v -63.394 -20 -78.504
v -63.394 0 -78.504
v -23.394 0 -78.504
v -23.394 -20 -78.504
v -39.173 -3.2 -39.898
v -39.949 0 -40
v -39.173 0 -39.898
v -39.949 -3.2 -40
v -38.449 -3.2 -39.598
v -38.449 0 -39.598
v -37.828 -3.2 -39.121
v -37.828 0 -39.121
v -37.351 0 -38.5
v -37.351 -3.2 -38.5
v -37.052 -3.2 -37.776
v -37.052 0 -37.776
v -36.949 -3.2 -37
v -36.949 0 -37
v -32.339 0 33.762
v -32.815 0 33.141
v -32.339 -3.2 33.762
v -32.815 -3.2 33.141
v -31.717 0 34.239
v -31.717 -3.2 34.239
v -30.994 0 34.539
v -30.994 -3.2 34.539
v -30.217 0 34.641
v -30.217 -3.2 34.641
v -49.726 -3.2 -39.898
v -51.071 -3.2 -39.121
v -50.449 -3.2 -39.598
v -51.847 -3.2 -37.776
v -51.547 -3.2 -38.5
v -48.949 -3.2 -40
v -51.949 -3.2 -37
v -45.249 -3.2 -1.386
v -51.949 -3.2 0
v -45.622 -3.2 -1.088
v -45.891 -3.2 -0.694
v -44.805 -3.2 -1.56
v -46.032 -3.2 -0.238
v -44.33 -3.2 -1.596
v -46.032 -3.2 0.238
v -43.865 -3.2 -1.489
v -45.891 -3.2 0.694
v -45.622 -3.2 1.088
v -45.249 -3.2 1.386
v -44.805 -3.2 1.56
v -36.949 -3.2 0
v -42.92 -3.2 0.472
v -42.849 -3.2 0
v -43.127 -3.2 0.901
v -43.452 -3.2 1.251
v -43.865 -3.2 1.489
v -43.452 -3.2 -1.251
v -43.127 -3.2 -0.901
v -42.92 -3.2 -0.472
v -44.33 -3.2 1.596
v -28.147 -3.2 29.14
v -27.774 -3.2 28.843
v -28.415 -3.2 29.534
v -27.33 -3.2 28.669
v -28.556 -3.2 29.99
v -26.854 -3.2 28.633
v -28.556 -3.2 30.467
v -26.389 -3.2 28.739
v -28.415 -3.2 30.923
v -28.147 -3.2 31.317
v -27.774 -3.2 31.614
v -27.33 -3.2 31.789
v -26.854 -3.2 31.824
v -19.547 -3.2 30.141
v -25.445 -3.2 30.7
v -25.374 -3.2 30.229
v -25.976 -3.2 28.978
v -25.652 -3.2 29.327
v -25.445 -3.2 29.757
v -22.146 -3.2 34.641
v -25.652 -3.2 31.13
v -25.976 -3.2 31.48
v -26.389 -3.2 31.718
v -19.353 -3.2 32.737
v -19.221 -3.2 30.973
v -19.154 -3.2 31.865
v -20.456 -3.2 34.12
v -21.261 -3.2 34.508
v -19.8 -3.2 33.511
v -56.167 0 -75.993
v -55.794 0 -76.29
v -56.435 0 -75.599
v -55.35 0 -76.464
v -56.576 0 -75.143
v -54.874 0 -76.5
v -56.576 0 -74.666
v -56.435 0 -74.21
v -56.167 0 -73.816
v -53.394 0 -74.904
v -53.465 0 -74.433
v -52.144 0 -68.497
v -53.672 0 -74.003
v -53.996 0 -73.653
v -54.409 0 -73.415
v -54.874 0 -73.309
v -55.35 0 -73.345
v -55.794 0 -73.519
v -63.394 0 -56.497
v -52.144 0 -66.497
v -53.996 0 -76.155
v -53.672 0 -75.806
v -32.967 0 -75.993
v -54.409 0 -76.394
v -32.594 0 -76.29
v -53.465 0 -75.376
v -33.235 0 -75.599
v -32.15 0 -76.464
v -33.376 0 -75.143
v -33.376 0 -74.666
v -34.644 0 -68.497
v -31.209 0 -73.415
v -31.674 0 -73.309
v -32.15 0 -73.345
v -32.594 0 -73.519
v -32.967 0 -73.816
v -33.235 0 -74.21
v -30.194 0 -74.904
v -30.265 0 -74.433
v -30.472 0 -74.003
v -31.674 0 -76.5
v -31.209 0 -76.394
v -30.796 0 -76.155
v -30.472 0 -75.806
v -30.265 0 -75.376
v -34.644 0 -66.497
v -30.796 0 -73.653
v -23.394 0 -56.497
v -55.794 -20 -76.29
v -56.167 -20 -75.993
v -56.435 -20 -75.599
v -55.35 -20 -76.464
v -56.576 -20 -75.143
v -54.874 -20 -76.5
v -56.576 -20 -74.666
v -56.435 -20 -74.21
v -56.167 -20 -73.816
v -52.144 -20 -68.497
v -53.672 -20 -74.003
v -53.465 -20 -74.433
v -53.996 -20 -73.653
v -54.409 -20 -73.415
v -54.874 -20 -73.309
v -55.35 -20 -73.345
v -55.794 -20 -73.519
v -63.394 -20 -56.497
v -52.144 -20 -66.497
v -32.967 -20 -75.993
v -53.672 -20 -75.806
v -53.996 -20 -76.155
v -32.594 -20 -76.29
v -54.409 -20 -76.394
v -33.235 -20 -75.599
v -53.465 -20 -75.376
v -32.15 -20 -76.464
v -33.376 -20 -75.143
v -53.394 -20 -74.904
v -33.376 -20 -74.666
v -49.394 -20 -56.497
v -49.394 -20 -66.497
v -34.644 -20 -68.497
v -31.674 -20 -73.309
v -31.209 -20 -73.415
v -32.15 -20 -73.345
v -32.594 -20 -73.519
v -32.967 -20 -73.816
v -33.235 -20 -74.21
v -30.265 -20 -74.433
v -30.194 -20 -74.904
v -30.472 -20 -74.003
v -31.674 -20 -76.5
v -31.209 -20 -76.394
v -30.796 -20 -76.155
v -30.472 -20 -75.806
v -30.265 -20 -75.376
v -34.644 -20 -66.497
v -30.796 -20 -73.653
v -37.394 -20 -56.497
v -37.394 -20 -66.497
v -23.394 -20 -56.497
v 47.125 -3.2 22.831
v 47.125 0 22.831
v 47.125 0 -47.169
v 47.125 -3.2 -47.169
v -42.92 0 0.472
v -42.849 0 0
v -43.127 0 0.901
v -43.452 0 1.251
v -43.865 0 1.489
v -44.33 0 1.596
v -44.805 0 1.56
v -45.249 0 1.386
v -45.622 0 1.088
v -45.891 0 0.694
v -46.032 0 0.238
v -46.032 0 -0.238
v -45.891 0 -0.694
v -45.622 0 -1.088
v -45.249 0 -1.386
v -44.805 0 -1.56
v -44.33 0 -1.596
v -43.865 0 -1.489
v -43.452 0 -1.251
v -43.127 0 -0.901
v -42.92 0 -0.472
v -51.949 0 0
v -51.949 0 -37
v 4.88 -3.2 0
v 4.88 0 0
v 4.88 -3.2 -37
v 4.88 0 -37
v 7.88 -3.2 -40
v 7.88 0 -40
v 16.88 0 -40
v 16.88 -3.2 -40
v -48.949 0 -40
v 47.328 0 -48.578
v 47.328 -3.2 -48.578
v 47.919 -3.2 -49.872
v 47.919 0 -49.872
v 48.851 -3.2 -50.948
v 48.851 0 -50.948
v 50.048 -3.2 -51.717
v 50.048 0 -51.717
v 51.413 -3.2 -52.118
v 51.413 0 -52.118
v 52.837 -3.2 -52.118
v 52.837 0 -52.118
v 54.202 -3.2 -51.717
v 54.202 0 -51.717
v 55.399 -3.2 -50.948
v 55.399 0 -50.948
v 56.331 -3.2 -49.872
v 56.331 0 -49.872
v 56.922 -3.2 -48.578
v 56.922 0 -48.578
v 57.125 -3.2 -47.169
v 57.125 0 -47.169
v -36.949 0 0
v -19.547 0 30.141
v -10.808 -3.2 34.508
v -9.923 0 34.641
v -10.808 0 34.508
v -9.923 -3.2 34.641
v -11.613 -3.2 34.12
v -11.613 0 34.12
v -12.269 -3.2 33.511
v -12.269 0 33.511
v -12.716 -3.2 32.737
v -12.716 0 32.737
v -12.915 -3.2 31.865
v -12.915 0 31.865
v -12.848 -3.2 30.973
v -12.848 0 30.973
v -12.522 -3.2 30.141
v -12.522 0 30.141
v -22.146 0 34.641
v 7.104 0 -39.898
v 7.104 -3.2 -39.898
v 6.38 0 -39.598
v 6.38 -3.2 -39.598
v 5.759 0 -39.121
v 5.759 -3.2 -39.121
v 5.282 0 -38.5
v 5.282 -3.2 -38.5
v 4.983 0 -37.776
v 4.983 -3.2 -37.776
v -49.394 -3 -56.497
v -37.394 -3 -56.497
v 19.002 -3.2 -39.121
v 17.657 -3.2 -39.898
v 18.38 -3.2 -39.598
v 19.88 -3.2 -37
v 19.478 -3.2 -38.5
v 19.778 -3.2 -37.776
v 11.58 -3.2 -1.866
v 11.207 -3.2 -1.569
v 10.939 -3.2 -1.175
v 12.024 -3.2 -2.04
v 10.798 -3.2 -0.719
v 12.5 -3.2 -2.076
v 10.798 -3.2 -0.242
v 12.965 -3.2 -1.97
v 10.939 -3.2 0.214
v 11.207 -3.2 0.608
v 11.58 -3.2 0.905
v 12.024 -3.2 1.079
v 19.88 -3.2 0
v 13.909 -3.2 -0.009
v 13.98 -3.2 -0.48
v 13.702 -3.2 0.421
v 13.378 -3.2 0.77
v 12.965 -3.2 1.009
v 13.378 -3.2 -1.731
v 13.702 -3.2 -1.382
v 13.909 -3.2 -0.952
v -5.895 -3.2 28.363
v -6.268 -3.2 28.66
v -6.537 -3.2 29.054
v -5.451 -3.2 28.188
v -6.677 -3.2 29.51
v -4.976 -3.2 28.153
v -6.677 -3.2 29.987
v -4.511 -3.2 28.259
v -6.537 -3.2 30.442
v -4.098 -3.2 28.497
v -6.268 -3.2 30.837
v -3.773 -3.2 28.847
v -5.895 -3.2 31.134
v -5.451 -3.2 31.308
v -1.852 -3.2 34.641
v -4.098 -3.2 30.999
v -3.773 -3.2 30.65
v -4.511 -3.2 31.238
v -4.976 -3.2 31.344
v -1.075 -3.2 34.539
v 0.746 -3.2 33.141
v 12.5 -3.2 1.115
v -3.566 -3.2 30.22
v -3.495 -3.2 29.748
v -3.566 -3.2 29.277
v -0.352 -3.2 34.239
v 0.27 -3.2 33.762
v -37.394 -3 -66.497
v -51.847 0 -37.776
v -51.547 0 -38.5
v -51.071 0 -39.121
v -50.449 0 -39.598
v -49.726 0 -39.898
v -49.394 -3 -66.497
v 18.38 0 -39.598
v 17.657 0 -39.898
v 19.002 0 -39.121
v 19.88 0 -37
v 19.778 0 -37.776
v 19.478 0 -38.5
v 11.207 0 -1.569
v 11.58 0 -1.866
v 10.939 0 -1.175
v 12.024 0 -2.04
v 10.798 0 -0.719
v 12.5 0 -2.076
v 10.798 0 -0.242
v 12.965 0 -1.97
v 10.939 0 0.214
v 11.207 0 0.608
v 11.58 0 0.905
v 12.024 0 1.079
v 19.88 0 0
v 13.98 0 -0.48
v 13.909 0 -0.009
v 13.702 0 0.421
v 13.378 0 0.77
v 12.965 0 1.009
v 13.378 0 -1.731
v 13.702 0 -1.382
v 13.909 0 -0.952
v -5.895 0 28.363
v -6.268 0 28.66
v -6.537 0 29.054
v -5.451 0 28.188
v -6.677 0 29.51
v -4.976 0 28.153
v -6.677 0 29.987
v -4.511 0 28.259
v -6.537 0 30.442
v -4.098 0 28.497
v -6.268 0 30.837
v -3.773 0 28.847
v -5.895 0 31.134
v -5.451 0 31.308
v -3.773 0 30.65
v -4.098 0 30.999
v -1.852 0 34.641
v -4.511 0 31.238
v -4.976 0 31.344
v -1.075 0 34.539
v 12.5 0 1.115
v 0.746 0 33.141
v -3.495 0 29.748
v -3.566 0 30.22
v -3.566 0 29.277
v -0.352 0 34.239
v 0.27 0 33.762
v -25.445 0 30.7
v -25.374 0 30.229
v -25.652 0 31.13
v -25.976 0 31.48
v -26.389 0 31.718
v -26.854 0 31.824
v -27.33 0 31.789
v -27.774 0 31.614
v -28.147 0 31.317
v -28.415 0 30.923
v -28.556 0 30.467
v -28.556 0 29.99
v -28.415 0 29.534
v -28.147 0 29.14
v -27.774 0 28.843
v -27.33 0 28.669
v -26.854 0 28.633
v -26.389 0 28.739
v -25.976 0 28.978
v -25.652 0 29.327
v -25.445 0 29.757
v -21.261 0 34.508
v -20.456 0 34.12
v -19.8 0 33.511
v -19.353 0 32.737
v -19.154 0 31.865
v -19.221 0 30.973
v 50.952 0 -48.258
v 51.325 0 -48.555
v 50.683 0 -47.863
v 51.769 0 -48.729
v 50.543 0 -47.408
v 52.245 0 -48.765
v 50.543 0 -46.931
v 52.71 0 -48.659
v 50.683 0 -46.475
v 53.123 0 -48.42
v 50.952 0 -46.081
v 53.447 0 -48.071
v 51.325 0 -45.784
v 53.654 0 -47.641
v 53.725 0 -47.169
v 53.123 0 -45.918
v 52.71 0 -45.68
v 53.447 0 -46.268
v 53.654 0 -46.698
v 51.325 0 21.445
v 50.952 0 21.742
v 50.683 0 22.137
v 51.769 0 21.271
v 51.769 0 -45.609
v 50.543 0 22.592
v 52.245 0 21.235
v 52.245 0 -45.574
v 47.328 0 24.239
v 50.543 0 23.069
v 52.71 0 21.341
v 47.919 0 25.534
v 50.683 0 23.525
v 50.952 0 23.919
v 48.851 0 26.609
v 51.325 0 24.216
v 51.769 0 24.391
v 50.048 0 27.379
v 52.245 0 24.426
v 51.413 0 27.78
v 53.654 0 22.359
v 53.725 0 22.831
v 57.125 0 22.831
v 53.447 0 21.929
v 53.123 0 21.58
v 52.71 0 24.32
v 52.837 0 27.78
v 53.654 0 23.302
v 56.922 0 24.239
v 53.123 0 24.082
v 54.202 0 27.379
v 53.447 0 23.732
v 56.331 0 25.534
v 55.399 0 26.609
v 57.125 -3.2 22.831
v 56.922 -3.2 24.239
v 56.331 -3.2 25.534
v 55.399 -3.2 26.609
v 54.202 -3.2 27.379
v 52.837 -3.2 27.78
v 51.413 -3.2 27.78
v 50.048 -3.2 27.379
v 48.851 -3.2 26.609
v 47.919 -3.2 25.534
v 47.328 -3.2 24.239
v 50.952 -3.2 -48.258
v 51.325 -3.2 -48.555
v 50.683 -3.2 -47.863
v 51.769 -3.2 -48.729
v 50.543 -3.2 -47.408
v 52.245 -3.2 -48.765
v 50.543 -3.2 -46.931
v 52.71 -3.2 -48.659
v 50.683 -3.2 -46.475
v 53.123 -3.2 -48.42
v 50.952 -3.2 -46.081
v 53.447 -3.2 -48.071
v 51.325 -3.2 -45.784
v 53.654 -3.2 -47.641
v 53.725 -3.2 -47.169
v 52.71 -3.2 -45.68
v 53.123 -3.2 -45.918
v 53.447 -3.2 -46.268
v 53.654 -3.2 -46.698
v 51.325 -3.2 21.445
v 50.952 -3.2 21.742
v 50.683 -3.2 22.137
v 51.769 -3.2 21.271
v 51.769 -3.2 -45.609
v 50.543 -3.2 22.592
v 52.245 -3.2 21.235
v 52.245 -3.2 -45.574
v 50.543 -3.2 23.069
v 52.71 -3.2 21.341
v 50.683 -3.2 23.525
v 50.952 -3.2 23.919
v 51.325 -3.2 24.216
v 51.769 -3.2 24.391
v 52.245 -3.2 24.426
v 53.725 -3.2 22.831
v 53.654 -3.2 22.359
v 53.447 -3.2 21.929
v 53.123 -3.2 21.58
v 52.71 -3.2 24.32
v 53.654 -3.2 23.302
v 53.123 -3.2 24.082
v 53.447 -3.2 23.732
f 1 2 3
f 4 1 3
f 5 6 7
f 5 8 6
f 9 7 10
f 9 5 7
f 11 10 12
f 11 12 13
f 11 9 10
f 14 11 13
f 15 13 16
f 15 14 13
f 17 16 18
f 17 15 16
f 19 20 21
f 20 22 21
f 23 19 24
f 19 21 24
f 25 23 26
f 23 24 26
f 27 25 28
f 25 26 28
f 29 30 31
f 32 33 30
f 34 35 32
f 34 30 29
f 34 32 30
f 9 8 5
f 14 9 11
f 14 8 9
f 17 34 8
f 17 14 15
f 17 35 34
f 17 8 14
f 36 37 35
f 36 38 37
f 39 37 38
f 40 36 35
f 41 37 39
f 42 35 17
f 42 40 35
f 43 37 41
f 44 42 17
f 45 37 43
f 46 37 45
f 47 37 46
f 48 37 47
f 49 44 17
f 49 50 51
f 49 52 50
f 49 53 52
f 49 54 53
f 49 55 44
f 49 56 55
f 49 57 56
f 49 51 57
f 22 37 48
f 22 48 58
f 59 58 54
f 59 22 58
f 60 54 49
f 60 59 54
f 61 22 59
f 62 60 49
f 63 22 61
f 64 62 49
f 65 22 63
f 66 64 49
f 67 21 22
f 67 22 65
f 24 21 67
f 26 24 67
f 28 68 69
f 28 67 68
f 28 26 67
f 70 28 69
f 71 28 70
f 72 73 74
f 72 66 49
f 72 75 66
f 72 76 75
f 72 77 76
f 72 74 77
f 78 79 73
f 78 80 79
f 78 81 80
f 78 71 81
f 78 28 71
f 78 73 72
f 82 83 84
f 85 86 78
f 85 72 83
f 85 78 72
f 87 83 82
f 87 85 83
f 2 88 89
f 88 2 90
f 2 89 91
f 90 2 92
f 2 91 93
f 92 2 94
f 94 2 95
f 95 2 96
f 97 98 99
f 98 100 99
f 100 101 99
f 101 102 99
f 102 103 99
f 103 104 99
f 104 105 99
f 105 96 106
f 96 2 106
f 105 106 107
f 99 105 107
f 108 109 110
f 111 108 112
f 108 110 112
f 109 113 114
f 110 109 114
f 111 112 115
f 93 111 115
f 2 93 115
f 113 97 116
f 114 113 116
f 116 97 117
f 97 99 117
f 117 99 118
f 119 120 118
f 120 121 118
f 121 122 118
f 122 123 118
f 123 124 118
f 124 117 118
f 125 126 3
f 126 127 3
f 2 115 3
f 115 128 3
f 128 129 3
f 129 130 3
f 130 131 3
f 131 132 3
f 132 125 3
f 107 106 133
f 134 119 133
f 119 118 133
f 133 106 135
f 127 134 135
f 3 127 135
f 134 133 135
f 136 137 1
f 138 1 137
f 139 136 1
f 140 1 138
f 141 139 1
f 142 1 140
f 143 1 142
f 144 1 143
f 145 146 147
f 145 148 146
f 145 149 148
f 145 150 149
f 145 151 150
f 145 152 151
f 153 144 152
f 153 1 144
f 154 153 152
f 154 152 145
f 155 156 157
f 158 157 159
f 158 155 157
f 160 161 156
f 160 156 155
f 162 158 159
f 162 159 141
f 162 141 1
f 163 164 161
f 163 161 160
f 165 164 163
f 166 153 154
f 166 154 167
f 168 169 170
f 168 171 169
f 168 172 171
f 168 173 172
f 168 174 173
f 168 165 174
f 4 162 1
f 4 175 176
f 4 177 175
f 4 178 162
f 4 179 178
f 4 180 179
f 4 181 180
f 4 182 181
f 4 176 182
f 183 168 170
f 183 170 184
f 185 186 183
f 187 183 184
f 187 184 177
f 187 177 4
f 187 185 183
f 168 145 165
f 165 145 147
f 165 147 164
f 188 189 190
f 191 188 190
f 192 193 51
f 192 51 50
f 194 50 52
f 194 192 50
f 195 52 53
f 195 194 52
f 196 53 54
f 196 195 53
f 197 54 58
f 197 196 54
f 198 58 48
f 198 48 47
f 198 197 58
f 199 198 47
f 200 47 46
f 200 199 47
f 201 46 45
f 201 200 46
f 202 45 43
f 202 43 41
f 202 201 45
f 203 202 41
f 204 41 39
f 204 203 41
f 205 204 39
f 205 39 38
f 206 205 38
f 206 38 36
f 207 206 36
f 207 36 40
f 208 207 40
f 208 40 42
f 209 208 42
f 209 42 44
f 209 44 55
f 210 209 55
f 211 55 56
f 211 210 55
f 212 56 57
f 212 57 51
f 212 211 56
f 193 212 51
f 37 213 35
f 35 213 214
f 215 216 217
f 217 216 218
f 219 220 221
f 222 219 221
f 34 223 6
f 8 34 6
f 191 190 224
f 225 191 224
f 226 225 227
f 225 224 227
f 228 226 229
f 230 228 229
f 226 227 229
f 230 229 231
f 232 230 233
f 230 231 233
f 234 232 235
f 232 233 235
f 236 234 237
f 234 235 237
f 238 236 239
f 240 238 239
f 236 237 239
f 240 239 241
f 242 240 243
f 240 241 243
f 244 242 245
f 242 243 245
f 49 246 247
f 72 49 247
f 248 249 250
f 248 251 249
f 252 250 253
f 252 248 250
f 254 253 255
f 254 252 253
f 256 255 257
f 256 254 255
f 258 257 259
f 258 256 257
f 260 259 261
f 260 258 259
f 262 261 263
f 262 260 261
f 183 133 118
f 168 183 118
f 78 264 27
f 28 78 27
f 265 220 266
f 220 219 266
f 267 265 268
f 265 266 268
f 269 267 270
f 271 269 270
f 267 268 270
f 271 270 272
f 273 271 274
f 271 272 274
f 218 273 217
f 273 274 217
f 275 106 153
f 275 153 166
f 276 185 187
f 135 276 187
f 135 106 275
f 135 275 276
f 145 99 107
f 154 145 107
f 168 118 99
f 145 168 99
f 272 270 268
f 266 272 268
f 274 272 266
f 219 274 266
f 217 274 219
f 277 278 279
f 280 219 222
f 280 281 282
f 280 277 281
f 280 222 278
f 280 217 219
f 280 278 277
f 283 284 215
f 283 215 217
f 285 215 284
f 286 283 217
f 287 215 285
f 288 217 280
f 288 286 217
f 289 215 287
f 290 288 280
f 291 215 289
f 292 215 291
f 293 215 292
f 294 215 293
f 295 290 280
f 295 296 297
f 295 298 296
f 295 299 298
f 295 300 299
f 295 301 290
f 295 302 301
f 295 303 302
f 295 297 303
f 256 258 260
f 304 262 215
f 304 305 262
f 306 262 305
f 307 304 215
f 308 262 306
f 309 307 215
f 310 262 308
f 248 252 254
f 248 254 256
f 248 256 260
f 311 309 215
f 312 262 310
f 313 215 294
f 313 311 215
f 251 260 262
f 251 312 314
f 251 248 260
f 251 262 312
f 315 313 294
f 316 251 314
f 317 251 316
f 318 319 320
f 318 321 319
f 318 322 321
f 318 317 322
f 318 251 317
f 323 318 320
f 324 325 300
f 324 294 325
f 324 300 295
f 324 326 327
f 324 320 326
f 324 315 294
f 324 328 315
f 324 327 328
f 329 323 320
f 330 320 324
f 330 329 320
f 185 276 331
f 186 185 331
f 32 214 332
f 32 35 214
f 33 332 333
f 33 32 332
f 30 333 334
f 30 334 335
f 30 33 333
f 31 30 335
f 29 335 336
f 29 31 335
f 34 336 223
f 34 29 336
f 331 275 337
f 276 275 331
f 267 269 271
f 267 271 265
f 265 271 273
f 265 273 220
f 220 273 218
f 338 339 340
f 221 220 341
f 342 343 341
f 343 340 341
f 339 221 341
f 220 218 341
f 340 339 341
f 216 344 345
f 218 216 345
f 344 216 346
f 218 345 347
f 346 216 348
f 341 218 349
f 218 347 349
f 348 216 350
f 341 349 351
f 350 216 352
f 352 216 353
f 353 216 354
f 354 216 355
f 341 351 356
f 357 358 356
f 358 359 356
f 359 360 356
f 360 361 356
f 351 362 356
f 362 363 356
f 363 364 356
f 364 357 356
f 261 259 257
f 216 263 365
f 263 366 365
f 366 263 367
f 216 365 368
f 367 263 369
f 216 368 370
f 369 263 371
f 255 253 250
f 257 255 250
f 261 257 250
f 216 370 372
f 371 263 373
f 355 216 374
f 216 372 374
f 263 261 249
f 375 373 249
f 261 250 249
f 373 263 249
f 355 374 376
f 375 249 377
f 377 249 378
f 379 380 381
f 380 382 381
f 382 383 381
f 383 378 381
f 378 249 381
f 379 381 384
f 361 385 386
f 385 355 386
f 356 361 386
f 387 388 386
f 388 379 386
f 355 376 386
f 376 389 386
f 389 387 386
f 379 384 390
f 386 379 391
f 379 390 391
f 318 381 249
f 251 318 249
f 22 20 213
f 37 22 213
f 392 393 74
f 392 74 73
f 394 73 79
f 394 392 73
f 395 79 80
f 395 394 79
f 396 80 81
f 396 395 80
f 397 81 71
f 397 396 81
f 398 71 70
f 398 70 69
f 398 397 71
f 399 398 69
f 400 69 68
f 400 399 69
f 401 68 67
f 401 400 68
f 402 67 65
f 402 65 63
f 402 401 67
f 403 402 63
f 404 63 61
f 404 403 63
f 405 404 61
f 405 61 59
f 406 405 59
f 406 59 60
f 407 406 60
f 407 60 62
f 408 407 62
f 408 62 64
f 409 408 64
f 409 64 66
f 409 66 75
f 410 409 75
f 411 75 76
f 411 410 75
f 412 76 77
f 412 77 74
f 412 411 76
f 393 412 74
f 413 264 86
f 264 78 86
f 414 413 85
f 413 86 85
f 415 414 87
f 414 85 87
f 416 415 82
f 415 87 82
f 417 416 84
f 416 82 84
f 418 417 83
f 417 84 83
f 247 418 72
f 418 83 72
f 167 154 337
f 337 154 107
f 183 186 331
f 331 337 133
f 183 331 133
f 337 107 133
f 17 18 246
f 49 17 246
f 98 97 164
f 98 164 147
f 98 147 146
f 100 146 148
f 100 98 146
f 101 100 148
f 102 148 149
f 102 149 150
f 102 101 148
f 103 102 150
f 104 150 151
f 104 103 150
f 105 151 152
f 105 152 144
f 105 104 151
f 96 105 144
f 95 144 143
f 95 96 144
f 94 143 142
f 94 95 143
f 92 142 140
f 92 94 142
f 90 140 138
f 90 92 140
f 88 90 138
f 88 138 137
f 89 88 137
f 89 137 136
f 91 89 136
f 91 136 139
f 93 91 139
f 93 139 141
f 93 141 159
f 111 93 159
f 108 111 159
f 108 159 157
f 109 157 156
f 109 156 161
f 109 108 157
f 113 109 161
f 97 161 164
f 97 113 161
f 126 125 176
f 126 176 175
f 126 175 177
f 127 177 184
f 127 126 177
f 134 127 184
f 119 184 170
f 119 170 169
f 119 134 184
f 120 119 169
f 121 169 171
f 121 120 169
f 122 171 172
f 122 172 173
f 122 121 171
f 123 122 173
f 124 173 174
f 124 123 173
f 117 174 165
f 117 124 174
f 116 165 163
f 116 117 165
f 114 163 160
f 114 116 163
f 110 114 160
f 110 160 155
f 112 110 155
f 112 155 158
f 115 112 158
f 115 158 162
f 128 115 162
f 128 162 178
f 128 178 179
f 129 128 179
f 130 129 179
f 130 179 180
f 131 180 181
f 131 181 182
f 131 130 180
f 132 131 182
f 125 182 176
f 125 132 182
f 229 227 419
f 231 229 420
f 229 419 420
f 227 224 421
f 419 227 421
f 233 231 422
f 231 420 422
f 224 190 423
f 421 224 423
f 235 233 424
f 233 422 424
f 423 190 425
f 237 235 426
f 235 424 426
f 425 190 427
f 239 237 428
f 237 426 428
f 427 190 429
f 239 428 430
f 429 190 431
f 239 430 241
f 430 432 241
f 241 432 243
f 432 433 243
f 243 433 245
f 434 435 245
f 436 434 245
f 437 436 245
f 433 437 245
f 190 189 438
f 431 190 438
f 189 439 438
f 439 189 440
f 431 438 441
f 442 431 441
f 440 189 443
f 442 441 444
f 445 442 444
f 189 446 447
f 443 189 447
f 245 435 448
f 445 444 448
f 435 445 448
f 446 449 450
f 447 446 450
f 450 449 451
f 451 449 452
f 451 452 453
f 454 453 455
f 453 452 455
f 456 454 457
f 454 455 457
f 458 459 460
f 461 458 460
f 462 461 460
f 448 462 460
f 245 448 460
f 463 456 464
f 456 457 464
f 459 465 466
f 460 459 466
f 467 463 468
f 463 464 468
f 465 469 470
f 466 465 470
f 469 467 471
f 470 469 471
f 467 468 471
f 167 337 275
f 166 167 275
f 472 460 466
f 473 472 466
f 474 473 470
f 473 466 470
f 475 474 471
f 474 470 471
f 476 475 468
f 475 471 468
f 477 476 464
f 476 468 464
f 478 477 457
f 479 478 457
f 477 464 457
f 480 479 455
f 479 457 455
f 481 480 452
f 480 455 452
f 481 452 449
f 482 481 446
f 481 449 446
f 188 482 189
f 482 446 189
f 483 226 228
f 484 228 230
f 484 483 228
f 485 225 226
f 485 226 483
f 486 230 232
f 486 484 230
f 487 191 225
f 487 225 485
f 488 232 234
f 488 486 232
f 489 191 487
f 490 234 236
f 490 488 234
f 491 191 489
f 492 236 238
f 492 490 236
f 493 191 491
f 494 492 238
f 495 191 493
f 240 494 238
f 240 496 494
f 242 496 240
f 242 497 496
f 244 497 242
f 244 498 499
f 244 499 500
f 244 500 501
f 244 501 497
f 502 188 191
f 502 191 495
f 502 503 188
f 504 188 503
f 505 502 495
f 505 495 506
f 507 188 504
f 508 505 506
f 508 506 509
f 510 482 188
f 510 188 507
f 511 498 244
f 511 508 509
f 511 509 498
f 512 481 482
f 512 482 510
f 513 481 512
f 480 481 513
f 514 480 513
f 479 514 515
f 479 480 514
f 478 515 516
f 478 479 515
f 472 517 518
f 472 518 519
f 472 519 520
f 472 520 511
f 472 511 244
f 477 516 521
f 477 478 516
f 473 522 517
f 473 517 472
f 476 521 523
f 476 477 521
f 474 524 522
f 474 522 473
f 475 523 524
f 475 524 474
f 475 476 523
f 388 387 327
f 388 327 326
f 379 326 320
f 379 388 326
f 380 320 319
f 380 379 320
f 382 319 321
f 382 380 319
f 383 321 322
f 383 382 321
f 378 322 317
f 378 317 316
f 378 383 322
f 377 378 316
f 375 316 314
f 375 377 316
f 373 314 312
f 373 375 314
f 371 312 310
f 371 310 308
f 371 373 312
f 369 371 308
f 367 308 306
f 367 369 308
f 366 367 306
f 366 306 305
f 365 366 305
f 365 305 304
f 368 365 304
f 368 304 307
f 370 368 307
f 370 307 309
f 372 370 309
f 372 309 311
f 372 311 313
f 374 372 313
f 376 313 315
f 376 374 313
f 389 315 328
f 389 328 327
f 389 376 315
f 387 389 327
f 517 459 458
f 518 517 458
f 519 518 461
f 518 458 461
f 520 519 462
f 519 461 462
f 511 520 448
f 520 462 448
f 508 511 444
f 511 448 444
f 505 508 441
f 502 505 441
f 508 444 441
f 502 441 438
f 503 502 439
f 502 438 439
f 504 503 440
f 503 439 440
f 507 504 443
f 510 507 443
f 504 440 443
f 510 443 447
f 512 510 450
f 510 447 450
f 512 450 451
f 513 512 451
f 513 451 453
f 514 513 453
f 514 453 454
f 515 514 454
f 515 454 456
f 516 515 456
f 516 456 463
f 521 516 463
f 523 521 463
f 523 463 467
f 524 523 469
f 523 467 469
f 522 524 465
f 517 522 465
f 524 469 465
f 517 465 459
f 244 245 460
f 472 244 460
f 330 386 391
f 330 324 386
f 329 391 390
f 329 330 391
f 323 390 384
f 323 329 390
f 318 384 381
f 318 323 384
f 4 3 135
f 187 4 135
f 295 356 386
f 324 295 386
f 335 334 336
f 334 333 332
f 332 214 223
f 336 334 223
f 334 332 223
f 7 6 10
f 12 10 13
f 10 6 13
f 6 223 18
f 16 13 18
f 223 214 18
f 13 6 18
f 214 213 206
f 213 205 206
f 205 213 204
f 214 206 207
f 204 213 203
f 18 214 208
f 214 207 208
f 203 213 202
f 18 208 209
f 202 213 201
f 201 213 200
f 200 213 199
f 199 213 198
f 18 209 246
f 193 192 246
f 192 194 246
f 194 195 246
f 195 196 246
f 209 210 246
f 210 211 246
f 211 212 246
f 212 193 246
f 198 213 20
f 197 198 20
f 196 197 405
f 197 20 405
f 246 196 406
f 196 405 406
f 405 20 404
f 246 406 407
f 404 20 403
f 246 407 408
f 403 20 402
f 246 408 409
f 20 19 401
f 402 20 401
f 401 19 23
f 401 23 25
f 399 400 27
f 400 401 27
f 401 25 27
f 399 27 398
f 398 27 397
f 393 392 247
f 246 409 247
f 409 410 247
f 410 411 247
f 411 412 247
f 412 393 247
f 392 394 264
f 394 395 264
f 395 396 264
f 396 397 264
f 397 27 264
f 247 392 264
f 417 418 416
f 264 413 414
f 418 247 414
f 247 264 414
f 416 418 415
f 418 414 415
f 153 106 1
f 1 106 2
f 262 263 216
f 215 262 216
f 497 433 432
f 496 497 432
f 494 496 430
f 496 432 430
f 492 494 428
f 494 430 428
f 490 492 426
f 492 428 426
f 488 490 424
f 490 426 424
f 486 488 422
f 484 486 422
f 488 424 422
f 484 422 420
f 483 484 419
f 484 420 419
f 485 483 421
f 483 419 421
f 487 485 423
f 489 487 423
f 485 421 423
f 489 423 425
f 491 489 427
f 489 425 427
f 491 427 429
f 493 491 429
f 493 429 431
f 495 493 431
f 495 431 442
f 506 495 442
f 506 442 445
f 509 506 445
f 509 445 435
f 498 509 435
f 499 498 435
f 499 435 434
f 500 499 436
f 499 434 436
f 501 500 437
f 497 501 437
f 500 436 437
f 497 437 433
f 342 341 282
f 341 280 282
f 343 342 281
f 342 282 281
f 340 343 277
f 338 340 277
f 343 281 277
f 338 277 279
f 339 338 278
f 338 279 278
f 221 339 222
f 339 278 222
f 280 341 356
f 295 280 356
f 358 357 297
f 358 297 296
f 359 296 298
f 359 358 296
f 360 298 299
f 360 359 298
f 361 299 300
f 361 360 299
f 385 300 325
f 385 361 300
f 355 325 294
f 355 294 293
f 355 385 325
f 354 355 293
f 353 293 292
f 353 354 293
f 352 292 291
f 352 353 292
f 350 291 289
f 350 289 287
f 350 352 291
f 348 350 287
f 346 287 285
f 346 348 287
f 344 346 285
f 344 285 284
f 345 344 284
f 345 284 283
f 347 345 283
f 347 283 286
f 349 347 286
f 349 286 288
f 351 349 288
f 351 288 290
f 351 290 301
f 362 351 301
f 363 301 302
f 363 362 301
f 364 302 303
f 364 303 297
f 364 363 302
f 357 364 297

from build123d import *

# Parameters (mm, degrees)
F0_R     = 1.6
F1_DEPTH = 3.2
F2_R     = 3
F2_2_R   = 3
F4_DEPTH = 3.2
F5_R     = 1.6
F6_DEPTH = 20
F5_W     = 12
F5_H     = 10
F7_DEPTH = 3


with BuildPart() as f1:
    # F0 (on Front) → F1 (new body)
    with BuildSketch(Plane.XZ):
        Polygon((19.8803772032, 0), (-0.1196227968, 34.6410161514), (-15.1196227968, 34.6410161514), (4.8803772032, 0), (4.8803772032, -40), (19.8803772032, -40), align=None)
        with Locations((12.3803772032, -0.4804348946)):
            Circle(F0_R, mode=Mode.SUBTRACT)
        with Locations((-5.0952010679, 29.748256281)):
            Circle(F0_R, mode=Mode.SUBTRACT)
    extrude(amount=F1_DEPTH)

    # F2#2
    f2_2_edges = [f1.edges().sort_by_distance(p)[0] for p in [
        (19.880377, -1.6, -40),
        (4.880377, -1.6, -40),
        (-15.119623, -1.6, 34.641016),
        (-0.119623, -1.6, 34.641016),
    ]]
    fillet(f2_2_edges, radius=F2_2_R)


with BuildPart() as f1b:
    # F0 (on Front) → F1, piece 2 (new body)
    with BuildSketch(Plane.XZ):
        Polygon((-31.9494143951, 34.6410161514), (-51.9494143951, 0), (-51.9494143951, -40), (-36.9494143951, -40), (-36.9494143951, 0), (-16.9494143951, 34.6410161514), align=None)
        with Locations((-44.4494143951, 0)):
            Circle(F0_R, mode=Mode.SUBTRACT)
        with Locations((-26.9738361239, 30.2286911756)):
            Circle(F0_R, mode=Mode.SUBTRACT)
    extrude(amount=F1_DEPTH)

    # F2
    f2_edges = [f1b.edges().sort_by_distance(p)[0] for p in [
        (-51.949414, -1.6, -40),
        (-36.949414, -1.6, -40),
        (-31.949414, -1.6, 34.641016),
        (-16.949414, -1.6, 34.641016),
    ]]
    fillet(f2_edges, radius=F2_R)


with BuildPart() as f4:
    # F3 (on Front) → F4 (new body)
    with BuildSketch(Plane.XZ):
        with BuildLine():
            ThreePointArc((50.5249999851, 22.8307303157), (52.1249999851, 24.4307303157), (53.7249999851, 22.8307303157))
            Line((53.7249999851, 22.8307303157), (57.1249999851, 22.8307303157))
            ThreePointArc((57.1249999851, 22.8307303157), (52.1249999851, 27.8307303157), (47.1249999851, 22.8307303157))
            Line((47.1249999851, 22.8307303157), (50.5249999851, 22.8307303157))
        make_face()
        with BuildLine():
            Line((57.1249999851, 22.8307303157), (53.7249999851, 22.8307303157))
            ThreePointArc((53.7249999851, 22.8307303157), (52.1249999851, 21.2307303157), (50.5249999851, 22.8307303157))
            Line((50.5249999851, 22.8307303157), (47.1249999851, 22.8307303157))
            ThreePointArc((47.1249999851, 22.8307303157), (52.1249999851, 17.8307303157), (57.1249999851, 22.8307303157))
        make_face()
        with BuildLine():
            Line((57.1249999851, -47.1692696843), (57.1249999851, 22.8307303157))
            ThreePointArc((57.1249999851, 22.8307303157), (52.1249999851, 17.8307303157), (47.1249999851, 22.8307303157))
            Line((47.1249999851, 22.8307303157), (47.1249999851, -47.1692696843))
            ThreePointArc((47.1249999851, -47.1692696843), (52.1249999851, -42.1692696843), (57.1249999851, -47.1692696843))
        make_face()
        with BuildLine():
            ThreePointArc((47.1249999851, -47.1692696843), (52.1249999851, -52.1692696843), (57.1249999851, -47.1692696843))
            Line((57.1249999851, -47.1692696843), (53.7249999851, -47.1692696843))
            ThreePointArc((53.7249999851, -47.1692696843), (52.1249999851, -48.7692696843), (50.5249999851, -47.1692696843))
            Line((50.5249999851, -47.1692696843), (47.1249999851, -47.1692696843))
        make_face()
        with BuildLine():
            Line((53.7249999851, -47.1692696843), (57.1249999851, -47.1692696843))
            ThreePointArc((57.1249999851, -47.1692696843), (52.1249999851, -42.1692696843), (47.1249999851, -47.1692696843))
            Line((47.1249999851, -47.1692696843), (50.5249999851, -47.1692696843))
            ThreePointArc((50.5249999851, -47.1692696843), (52.1249999851, -45.5692696843), (53.7249999851, -47.1692696843))
        make_face()
    extrude(amount=F4_DEPTH)


with BuildPart() as f6:
    # F5 (on Front) → F6 (new body)
    with BuildSketch(Plane.XZ):
        Polygon((-49.3939027905, -56.4967670194), (-63.3939027905, -56.4967670194), (-63.3939027905, -78.5043969103), (-23.3939027905, -78.5043969103), (-23.3939027905, -56.4967670194), (-37.3939027905, -56.4967670194), (-37.3939027905, -66.4967670194), (-34.6439027905, -66.4967670194), (-34.6439027905, -68.4967670194), (-52.1439027905, -68.4967670194), (-52.1439027905, -66.4967670194), (-49.3939027905, -66.4967670194), align=None)
        with Locations((-54.9939027905, -74.9043969103)):
            Circle(F5_R, mode=Mode.SUBTRACT)
        with Locations((-31.7939027905, -74.9043969103)):
            Circle(F5_R, mode=Mode.SUBTRACT)
    extrude(amount=F6_DEPTH)

    # F5 (on Front) → F7 (join)
    with BuildSketch(Plane.XZ):
        with Locations((-43.3939027905, -61.4967670194)):
            Rectangle(F5_W, F5_H)
    extrude(amount=F7_DEPTH)


solid = Compound([f1.part, f1b.part, f4.part, f6.part])
